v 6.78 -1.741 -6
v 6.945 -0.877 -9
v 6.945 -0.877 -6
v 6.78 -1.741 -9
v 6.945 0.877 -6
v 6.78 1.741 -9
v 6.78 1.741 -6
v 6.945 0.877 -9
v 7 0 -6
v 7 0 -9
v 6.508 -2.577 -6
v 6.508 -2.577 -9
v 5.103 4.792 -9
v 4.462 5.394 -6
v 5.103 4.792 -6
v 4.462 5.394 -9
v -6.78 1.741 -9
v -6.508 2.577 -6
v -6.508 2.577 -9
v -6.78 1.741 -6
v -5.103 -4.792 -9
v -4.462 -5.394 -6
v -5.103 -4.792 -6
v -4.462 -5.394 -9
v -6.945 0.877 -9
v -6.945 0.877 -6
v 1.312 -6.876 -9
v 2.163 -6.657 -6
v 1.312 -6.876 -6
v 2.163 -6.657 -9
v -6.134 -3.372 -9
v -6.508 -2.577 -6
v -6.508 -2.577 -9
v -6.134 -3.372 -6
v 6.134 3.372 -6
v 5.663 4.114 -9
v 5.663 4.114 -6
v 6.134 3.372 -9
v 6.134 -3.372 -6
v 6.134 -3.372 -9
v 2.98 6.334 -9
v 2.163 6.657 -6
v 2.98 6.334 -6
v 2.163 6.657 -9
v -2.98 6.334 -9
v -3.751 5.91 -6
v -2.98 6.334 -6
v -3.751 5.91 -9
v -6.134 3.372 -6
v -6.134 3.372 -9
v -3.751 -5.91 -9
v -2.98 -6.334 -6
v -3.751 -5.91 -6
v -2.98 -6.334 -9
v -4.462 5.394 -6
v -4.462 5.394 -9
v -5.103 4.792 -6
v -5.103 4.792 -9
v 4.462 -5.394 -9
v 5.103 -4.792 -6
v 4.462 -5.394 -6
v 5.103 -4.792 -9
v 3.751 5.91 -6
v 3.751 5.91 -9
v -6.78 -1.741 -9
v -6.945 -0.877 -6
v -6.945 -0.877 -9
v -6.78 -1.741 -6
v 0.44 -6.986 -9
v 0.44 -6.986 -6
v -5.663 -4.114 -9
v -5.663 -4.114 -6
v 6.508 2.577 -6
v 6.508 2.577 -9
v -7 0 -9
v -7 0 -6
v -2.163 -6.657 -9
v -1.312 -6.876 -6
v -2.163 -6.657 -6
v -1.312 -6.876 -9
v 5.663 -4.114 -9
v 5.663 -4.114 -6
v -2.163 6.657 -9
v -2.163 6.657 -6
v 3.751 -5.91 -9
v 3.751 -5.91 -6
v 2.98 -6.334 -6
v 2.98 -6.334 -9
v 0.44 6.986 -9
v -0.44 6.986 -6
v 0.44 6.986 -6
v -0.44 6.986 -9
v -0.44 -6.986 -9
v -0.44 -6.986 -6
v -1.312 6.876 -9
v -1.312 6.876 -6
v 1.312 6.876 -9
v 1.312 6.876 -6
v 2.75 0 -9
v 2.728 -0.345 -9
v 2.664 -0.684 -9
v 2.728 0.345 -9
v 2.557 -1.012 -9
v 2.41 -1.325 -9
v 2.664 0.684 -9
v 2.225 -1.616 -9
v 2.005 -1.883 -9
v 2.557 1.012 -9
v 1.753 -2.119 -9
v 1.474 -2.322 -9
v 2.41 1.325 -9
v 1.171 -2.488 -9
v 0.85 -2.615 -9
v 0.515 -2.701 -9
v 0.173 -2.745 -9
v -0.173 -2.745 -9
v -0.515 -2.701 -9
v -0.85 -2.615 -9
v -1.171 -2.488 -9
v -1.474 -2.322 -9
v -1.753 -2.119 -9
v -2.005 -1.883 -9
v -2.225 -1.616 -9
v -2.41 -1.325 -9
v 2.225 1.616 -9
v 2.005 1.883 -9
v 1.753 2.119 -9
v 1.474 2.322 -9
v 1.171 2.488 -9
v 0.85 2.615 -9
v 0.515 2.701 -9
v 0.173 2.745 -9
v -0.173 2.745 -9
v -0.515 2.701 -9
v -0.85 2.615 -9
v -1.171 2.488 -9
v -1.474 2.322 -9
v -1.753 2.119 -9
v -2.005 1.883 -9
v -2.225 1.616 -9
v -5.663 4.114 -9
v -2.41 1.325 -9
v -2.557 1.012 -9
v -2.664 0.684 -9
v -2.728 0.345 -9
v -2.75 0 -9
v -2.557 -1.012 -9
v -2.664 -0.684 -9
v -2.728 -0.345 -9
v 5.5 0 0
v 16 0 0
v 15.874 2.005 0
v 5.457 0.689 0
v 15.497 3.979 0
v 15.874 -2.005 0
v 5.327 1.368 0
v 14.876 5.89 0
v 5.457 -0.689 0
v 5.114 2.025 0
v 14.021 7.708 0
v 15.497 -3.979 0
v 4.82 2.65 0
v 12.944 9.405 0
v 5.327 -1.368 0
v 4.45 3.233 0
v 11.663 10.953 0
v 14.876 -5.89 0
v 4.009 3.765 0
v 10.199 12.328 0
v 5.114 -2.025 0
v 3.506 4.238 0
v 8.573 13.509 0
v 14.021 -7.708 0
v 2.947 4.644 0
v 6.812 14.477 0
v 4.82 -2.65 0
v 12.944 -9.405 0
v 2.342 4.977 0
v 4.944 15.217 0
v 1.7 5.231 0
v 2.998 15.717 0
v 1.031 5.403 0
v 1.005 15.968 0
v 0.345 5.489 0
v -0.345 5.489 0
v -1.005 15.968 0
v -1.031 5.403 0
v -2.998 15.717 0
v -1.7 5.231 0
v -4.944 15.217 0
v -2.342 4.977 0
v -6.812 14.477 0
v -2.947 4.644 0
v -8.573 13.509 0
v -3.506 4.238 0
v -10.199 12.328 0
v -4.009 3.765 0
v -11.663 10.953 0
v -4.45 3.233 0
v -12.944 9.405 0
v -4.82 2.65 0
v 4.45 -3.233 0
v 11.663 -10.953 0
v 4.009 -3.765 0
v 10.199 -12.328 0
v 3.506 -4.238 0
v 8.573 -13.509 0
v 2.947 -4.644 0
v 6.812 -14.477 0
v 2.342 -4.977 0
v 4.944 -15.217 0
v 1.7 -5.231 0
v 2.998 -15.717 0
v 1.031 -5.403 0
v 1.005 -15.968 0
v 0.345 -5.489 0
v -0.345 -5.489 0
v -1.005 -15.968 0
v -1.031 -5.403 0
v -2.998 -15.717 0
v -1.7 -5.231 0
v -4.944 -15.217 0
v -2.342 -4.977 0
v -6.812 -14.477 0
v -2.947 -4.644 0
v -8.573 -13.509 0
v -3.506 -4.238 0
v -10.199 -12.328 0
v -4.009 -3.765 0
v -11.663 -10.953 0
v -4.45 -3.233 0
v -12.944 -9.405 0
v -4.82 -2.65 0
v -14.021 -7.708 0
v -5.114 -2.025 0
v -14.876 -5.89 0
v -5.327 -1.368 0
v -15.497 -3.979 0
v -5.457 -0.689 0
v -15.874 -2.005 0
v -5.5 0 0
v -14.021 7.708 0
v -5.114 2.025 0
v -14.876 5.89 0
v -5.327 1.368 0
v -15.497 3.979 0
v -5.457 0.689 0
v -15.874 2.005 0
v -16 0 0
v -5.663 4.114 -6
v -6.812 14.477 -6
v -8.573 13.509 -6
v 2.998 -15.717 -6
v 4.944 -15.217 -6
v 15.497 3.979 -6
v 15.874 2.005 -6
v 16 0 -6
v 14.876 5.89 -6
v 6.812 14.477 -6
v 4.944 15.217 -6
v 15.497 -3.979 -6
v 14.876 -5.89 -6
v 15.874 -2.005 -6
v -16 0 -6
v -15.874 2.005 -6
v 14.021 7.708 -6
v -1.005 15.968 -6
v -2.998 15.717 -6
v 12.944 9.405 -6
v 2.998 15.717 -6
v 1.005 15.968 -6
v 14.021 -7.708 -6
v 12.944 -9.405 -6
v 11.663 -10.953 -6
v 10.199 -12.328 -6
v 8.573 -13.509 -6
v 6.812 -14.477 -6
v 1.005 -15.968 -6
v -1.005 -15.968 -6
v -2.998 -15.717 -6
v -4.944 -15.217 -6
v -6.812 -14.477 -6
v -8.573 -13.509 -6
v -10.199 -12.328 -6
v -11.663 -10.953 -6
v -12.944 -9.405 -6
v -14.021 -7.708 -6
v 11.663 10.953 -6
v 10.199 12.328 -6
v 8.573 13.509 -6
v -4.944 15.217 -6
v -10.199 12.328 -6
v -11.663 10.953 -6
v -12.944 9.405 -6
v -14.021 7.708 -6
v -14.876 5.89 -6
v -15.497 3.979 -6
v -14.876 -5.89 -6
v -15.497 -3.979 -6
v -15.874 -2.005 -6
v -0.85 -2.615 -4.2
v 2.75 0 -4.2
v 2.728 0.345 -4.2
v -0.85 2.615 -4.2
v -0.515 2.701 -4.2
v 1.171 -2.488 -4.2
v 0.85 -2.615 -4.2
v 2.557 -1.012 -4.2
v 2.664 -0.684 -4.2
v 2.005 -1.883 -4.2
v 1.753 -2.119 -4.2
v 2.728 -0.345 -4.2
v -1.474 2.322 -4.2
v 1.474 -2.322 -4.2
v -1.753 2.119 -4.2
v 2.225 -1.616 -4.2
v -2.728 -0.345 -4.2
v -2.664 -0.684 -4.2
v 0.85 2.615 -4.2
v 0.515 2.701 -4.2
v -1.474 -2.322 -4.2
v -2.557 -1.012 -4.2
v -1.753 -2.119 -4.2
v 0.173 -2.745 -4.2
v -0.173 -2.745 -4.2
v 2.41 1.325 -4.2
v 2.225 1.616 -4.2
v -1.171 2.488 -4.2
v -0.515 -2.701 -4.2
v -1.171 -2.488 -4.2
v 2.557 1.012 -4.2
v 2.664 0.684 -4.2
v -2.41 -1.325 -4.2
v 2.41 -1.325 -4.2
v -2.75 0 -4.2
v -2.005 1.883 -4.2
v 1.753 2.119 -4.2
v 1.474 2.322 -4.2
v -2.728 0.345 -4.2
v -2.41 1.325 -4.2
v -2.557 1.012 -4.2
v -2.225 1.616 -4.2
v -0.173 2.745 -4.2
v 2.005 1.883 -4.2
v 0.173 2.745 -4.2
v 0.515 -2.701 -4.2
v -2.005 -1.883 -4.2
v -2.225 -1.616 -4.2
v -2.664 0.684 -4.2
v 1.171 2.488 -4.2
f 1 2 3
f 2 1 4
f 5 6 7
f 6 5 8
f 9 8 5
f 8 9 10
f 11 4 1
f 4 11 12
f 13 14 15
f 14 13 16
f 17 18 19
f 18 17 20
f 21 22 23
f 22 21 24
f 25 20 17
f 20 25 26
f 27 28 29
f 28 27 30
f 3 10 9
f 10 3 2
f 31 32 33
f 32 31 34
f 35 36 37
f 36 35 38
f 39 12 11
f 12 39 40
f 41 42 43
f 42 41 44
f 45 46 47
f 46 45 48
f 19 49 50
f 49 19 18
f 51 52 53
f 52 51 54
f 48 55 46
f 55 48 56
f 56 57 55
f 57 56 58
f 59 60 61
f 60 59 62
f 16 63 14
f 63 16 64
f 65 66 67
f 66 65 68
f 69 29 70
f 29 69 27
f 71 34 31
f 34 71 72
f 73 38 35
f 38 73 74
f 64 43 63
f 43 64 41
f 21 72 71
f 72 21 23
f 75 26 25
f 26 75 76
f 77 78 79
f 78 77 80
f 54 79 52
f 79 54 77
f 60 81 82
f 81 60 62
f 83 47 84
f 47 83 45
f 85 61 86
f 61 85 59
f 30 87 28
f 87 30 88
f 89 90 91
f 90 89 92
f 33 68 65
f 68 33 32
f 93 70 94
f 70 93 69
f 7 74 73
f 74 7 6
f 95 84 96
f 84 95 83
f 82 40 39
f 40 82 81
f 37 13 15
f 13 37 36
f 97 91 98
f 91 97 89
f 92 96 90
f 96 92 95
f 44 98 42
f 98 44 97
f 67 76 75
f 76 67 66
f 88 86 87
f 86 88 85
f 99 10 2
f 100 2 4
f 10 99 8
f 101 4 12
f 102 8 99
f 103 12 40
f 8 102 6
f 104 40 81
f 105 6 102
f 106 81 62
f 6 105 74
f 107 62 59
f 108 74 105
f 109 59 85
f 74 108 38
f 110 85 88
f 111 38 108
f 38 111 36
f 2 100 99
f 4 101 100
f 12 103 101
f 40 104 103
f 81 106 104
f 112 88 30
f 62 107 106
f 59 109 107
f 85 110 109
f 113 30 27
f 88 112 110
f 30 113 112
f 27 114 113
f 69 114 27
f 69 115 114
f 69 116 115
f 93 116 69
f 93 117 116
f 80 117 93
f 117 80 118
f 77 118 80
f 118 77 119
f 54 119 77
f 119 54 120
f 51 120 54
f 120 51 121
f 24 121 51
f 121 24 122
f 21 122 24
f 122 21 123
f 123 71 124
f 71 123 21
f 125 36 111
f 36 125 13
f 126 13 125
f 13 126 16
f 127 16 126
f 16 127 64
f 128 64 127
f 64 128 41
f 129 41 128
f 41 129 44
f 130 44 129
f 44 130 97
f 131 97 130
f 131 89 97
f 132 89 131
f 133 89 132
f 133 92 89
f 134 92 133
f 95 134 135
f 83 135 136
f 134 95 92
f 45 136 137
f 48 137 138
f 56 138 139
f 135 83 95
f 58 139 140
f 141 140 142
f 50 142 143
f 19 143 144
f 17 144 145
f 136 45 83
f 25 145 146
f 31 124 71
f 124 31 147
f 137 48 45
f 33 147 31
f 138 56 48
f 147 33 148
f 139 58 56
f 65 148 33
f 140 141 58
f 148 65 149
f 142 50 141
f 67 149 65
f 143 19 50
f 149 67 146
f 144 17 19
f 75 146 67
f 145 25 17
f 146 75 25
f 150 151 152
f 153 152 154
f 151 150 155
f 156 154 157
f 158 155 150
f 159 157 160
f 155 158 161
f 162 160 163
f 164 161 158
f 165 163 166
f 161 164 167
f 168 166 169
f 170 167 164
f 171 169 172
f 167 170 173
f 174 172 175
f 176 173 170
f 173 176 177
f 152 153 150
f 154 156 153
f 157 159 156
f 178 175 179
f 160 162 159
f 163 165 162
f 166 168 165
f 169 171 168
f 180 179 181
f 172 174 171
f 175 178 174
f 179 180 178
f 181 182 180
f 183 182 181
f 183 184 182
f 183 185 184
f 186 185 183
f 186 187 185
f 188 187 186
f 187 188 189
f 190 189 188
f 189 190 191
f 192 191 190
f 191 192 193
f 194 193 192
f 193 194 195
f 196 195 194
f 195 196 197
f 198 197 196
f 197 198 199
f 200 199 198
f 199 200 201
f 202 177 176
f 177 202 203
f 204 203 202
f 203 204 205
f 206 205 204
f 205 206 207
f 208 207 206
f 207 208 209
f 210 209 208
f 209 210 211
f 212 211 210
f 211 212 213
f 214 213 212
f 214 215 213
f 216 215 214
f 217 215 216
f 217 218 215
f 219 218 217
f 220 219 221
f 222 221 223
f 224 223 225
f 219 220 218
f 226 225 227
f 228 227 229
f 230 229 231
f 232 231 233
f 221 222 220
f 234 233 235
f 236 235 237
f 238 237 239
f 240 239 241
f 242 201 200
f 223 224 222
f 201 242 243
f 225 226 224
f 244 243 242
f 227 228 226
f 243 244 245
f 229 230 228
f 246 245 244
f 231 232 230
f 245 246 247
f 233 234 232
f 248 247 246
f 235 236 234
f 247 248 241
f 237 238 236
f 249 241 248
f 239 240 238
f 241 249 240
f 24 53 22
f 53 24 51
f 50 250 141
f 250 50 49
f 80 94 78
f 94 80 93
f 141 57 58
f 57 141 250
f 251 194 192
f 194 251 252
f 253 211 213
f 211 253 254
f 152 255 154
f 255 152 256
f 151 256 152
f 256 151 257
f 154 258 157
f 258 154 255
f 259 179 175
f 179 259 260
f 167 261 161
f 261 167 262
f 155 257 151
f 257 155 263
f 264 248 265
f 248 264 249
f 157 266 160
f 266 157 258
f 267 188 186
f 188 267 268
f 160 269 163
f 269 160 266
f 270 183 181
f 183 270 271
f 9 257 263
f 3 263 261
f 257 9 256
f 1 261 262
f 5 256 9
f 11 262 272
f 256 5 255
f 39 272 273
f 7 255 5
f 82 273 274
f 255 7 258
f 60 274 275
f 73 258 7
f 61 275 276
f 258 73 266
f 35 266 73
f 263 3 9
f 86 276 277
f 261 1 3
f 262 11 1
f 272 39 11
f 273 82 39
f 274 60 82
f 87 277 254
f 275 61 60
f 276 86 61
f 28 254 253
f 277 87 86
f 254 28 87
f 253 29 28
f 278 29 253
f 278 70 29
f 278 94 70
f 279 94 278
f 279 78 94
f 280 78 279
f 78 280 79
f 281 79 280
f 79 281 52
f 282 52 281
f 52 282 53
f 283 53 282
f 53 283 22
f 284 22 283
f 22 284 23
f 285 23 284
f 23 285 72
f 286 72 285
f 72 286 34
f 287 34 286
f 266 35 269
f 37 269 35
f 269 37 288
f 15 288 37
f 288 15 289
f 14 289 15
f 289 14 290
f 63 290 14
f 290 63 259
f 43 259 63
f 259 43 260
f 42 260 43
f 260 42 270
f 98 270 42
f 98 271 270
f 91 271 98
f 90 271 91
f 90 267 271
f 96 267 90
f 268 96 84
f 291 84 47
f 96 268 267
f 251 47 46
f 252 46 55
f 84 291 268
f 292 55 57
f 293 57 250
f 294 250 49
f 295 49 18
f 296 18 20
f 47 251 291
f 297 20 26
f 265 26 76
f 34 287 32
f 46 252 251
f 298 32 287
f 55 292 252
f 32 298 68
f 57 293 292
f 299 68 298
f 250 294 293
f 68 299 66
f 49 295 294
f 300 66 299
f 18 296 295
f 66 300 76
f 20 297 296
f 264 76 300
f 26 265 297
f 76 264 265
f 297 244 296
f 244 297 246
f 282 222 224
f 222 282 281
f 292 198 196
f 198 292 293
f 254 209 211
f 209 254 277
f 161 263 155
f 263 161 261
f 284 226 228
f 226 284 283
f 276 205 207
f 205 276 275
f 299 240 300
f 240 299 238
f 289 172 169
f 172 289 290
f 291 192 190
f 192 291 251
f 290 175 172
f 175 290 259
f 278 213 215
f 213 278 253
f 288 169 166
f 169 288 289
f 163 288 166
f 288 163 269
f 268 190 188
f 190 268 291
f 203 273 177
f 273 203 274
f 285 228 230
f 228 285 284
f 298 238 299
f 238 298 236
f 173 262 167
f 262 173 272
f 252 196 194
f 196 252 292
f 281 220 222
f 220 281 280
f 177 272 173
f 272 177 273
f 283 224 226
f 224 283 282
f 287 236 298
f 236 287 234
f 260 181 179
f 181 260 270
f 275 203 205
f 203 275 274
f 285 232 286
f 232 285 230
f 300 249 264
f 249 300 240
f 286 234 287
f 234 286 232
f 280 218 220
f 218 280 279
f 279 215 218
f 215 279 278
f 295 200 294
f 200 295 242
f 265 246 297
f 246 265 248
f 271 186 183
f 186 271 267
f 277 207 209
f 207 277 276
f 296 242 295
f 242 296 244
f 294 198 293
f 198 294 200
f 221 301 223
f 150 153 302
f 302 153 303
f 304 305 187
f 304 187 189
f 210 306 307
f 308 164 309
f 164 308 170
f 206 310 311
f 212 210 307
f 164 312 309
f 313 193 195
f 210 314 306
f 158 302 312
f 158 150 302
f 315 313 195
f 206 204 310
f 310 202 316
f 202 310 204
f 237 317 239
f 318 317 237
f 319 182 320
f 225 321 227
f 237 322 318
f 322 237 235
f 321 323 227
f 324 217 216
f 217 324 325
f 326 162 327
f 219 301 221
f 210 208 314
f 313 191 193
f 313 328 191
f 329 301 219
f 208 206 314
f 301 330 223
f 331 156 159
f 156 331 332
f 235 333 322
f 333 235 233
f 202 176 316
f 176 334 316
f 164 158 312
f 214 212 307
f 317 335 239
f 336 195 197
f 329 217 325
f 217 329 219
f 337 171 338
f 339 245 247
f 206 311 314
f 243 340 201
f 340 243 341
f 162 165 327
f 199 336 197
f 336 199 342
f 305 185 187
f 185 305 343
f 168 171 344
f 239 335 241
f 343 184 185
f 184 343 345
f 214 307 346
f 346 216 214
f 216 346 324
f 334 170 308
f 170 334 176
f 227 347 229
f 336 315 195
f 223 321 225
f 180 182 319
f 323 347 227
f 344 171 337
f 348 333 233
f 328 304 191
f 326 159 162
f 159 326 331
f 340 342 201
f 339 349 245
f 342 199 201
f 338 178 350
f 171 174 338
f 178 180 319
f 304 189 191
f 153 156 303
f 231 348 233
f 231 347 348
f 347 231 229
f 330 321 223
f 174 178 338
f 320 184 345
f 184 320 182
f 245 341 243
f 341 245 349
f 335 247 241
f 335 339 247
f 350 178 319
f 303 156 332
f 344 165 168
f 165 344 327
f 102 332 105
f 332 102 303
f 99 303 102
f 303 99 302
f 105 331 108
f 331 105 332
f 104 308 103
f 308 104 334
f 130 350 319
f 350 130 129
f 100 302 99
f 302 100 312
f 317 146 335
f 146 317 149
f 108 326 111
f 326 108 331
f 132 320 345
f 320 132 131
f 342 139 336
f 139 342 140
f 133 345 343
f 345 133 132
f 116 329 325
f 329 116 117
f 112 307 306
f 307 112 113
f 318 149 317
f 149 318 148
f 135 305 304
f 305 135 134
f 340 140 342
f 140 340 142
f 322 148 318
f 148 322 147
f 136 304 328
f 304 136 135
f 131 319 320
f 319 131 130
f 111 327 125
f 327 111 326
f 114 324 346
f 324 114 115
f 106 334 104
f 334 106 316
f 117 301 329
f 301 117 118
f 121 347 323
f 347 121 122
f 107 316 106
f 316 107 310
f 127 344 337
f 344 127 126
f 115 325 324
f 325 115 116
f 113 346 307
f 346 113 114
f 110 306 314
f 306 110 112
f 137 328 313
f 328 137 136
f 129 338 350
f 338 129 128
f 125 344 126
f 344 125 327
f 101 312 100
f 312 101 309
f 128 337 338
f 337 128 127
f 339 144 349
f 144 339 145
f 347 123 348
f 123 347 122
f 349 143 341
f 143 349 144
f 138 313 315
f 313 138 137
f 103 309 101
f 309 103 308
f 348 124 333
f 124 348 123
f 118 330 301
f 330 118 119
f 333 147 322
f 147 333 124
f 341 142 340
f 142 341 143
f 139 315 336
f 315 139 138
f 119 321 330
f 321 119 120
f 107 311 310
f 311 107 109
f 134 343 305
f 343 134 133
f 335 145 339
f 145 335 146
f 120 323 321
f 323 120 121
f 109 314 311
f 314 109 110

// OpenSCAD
$fn = 50;


difference() {
	union() {
		translate(v = [0, 0, -9.0000000000]) {
			cylinder(h = 9, r = 7.0000000000);
		}
		translate(v = [0, 0, -6.0000000000]) {
			cylinder(h = 6, r = 16.0000000000);
		}
	}
	union() {
		translate(v = [0, 0, 0]) {
			rotate(a = [0, 0, 0]) {
				difference() {
					union() {
						#translate(v = [0, 0, -9.0000000000]) {
							cylinder(h = 9, r = 2.2500000000);
						}
						#translate(v = [0, 0, -4.2000000000]) {
							cylinder(h = 4.2000000000, r1 = 2.7500000000, r2 = 5.5000000000);
						}
						#translate(v = [0, 0, -9.0000000000]) {
							cylinder(h = 9, r = 2.7500000000);
						}
						#translate(v = [0, 0, -9.0000000000]) {
							cylinder(h = 9, r = 2.2500000000);
						}
					}
					union();
				}
			}
		}
	}
}
